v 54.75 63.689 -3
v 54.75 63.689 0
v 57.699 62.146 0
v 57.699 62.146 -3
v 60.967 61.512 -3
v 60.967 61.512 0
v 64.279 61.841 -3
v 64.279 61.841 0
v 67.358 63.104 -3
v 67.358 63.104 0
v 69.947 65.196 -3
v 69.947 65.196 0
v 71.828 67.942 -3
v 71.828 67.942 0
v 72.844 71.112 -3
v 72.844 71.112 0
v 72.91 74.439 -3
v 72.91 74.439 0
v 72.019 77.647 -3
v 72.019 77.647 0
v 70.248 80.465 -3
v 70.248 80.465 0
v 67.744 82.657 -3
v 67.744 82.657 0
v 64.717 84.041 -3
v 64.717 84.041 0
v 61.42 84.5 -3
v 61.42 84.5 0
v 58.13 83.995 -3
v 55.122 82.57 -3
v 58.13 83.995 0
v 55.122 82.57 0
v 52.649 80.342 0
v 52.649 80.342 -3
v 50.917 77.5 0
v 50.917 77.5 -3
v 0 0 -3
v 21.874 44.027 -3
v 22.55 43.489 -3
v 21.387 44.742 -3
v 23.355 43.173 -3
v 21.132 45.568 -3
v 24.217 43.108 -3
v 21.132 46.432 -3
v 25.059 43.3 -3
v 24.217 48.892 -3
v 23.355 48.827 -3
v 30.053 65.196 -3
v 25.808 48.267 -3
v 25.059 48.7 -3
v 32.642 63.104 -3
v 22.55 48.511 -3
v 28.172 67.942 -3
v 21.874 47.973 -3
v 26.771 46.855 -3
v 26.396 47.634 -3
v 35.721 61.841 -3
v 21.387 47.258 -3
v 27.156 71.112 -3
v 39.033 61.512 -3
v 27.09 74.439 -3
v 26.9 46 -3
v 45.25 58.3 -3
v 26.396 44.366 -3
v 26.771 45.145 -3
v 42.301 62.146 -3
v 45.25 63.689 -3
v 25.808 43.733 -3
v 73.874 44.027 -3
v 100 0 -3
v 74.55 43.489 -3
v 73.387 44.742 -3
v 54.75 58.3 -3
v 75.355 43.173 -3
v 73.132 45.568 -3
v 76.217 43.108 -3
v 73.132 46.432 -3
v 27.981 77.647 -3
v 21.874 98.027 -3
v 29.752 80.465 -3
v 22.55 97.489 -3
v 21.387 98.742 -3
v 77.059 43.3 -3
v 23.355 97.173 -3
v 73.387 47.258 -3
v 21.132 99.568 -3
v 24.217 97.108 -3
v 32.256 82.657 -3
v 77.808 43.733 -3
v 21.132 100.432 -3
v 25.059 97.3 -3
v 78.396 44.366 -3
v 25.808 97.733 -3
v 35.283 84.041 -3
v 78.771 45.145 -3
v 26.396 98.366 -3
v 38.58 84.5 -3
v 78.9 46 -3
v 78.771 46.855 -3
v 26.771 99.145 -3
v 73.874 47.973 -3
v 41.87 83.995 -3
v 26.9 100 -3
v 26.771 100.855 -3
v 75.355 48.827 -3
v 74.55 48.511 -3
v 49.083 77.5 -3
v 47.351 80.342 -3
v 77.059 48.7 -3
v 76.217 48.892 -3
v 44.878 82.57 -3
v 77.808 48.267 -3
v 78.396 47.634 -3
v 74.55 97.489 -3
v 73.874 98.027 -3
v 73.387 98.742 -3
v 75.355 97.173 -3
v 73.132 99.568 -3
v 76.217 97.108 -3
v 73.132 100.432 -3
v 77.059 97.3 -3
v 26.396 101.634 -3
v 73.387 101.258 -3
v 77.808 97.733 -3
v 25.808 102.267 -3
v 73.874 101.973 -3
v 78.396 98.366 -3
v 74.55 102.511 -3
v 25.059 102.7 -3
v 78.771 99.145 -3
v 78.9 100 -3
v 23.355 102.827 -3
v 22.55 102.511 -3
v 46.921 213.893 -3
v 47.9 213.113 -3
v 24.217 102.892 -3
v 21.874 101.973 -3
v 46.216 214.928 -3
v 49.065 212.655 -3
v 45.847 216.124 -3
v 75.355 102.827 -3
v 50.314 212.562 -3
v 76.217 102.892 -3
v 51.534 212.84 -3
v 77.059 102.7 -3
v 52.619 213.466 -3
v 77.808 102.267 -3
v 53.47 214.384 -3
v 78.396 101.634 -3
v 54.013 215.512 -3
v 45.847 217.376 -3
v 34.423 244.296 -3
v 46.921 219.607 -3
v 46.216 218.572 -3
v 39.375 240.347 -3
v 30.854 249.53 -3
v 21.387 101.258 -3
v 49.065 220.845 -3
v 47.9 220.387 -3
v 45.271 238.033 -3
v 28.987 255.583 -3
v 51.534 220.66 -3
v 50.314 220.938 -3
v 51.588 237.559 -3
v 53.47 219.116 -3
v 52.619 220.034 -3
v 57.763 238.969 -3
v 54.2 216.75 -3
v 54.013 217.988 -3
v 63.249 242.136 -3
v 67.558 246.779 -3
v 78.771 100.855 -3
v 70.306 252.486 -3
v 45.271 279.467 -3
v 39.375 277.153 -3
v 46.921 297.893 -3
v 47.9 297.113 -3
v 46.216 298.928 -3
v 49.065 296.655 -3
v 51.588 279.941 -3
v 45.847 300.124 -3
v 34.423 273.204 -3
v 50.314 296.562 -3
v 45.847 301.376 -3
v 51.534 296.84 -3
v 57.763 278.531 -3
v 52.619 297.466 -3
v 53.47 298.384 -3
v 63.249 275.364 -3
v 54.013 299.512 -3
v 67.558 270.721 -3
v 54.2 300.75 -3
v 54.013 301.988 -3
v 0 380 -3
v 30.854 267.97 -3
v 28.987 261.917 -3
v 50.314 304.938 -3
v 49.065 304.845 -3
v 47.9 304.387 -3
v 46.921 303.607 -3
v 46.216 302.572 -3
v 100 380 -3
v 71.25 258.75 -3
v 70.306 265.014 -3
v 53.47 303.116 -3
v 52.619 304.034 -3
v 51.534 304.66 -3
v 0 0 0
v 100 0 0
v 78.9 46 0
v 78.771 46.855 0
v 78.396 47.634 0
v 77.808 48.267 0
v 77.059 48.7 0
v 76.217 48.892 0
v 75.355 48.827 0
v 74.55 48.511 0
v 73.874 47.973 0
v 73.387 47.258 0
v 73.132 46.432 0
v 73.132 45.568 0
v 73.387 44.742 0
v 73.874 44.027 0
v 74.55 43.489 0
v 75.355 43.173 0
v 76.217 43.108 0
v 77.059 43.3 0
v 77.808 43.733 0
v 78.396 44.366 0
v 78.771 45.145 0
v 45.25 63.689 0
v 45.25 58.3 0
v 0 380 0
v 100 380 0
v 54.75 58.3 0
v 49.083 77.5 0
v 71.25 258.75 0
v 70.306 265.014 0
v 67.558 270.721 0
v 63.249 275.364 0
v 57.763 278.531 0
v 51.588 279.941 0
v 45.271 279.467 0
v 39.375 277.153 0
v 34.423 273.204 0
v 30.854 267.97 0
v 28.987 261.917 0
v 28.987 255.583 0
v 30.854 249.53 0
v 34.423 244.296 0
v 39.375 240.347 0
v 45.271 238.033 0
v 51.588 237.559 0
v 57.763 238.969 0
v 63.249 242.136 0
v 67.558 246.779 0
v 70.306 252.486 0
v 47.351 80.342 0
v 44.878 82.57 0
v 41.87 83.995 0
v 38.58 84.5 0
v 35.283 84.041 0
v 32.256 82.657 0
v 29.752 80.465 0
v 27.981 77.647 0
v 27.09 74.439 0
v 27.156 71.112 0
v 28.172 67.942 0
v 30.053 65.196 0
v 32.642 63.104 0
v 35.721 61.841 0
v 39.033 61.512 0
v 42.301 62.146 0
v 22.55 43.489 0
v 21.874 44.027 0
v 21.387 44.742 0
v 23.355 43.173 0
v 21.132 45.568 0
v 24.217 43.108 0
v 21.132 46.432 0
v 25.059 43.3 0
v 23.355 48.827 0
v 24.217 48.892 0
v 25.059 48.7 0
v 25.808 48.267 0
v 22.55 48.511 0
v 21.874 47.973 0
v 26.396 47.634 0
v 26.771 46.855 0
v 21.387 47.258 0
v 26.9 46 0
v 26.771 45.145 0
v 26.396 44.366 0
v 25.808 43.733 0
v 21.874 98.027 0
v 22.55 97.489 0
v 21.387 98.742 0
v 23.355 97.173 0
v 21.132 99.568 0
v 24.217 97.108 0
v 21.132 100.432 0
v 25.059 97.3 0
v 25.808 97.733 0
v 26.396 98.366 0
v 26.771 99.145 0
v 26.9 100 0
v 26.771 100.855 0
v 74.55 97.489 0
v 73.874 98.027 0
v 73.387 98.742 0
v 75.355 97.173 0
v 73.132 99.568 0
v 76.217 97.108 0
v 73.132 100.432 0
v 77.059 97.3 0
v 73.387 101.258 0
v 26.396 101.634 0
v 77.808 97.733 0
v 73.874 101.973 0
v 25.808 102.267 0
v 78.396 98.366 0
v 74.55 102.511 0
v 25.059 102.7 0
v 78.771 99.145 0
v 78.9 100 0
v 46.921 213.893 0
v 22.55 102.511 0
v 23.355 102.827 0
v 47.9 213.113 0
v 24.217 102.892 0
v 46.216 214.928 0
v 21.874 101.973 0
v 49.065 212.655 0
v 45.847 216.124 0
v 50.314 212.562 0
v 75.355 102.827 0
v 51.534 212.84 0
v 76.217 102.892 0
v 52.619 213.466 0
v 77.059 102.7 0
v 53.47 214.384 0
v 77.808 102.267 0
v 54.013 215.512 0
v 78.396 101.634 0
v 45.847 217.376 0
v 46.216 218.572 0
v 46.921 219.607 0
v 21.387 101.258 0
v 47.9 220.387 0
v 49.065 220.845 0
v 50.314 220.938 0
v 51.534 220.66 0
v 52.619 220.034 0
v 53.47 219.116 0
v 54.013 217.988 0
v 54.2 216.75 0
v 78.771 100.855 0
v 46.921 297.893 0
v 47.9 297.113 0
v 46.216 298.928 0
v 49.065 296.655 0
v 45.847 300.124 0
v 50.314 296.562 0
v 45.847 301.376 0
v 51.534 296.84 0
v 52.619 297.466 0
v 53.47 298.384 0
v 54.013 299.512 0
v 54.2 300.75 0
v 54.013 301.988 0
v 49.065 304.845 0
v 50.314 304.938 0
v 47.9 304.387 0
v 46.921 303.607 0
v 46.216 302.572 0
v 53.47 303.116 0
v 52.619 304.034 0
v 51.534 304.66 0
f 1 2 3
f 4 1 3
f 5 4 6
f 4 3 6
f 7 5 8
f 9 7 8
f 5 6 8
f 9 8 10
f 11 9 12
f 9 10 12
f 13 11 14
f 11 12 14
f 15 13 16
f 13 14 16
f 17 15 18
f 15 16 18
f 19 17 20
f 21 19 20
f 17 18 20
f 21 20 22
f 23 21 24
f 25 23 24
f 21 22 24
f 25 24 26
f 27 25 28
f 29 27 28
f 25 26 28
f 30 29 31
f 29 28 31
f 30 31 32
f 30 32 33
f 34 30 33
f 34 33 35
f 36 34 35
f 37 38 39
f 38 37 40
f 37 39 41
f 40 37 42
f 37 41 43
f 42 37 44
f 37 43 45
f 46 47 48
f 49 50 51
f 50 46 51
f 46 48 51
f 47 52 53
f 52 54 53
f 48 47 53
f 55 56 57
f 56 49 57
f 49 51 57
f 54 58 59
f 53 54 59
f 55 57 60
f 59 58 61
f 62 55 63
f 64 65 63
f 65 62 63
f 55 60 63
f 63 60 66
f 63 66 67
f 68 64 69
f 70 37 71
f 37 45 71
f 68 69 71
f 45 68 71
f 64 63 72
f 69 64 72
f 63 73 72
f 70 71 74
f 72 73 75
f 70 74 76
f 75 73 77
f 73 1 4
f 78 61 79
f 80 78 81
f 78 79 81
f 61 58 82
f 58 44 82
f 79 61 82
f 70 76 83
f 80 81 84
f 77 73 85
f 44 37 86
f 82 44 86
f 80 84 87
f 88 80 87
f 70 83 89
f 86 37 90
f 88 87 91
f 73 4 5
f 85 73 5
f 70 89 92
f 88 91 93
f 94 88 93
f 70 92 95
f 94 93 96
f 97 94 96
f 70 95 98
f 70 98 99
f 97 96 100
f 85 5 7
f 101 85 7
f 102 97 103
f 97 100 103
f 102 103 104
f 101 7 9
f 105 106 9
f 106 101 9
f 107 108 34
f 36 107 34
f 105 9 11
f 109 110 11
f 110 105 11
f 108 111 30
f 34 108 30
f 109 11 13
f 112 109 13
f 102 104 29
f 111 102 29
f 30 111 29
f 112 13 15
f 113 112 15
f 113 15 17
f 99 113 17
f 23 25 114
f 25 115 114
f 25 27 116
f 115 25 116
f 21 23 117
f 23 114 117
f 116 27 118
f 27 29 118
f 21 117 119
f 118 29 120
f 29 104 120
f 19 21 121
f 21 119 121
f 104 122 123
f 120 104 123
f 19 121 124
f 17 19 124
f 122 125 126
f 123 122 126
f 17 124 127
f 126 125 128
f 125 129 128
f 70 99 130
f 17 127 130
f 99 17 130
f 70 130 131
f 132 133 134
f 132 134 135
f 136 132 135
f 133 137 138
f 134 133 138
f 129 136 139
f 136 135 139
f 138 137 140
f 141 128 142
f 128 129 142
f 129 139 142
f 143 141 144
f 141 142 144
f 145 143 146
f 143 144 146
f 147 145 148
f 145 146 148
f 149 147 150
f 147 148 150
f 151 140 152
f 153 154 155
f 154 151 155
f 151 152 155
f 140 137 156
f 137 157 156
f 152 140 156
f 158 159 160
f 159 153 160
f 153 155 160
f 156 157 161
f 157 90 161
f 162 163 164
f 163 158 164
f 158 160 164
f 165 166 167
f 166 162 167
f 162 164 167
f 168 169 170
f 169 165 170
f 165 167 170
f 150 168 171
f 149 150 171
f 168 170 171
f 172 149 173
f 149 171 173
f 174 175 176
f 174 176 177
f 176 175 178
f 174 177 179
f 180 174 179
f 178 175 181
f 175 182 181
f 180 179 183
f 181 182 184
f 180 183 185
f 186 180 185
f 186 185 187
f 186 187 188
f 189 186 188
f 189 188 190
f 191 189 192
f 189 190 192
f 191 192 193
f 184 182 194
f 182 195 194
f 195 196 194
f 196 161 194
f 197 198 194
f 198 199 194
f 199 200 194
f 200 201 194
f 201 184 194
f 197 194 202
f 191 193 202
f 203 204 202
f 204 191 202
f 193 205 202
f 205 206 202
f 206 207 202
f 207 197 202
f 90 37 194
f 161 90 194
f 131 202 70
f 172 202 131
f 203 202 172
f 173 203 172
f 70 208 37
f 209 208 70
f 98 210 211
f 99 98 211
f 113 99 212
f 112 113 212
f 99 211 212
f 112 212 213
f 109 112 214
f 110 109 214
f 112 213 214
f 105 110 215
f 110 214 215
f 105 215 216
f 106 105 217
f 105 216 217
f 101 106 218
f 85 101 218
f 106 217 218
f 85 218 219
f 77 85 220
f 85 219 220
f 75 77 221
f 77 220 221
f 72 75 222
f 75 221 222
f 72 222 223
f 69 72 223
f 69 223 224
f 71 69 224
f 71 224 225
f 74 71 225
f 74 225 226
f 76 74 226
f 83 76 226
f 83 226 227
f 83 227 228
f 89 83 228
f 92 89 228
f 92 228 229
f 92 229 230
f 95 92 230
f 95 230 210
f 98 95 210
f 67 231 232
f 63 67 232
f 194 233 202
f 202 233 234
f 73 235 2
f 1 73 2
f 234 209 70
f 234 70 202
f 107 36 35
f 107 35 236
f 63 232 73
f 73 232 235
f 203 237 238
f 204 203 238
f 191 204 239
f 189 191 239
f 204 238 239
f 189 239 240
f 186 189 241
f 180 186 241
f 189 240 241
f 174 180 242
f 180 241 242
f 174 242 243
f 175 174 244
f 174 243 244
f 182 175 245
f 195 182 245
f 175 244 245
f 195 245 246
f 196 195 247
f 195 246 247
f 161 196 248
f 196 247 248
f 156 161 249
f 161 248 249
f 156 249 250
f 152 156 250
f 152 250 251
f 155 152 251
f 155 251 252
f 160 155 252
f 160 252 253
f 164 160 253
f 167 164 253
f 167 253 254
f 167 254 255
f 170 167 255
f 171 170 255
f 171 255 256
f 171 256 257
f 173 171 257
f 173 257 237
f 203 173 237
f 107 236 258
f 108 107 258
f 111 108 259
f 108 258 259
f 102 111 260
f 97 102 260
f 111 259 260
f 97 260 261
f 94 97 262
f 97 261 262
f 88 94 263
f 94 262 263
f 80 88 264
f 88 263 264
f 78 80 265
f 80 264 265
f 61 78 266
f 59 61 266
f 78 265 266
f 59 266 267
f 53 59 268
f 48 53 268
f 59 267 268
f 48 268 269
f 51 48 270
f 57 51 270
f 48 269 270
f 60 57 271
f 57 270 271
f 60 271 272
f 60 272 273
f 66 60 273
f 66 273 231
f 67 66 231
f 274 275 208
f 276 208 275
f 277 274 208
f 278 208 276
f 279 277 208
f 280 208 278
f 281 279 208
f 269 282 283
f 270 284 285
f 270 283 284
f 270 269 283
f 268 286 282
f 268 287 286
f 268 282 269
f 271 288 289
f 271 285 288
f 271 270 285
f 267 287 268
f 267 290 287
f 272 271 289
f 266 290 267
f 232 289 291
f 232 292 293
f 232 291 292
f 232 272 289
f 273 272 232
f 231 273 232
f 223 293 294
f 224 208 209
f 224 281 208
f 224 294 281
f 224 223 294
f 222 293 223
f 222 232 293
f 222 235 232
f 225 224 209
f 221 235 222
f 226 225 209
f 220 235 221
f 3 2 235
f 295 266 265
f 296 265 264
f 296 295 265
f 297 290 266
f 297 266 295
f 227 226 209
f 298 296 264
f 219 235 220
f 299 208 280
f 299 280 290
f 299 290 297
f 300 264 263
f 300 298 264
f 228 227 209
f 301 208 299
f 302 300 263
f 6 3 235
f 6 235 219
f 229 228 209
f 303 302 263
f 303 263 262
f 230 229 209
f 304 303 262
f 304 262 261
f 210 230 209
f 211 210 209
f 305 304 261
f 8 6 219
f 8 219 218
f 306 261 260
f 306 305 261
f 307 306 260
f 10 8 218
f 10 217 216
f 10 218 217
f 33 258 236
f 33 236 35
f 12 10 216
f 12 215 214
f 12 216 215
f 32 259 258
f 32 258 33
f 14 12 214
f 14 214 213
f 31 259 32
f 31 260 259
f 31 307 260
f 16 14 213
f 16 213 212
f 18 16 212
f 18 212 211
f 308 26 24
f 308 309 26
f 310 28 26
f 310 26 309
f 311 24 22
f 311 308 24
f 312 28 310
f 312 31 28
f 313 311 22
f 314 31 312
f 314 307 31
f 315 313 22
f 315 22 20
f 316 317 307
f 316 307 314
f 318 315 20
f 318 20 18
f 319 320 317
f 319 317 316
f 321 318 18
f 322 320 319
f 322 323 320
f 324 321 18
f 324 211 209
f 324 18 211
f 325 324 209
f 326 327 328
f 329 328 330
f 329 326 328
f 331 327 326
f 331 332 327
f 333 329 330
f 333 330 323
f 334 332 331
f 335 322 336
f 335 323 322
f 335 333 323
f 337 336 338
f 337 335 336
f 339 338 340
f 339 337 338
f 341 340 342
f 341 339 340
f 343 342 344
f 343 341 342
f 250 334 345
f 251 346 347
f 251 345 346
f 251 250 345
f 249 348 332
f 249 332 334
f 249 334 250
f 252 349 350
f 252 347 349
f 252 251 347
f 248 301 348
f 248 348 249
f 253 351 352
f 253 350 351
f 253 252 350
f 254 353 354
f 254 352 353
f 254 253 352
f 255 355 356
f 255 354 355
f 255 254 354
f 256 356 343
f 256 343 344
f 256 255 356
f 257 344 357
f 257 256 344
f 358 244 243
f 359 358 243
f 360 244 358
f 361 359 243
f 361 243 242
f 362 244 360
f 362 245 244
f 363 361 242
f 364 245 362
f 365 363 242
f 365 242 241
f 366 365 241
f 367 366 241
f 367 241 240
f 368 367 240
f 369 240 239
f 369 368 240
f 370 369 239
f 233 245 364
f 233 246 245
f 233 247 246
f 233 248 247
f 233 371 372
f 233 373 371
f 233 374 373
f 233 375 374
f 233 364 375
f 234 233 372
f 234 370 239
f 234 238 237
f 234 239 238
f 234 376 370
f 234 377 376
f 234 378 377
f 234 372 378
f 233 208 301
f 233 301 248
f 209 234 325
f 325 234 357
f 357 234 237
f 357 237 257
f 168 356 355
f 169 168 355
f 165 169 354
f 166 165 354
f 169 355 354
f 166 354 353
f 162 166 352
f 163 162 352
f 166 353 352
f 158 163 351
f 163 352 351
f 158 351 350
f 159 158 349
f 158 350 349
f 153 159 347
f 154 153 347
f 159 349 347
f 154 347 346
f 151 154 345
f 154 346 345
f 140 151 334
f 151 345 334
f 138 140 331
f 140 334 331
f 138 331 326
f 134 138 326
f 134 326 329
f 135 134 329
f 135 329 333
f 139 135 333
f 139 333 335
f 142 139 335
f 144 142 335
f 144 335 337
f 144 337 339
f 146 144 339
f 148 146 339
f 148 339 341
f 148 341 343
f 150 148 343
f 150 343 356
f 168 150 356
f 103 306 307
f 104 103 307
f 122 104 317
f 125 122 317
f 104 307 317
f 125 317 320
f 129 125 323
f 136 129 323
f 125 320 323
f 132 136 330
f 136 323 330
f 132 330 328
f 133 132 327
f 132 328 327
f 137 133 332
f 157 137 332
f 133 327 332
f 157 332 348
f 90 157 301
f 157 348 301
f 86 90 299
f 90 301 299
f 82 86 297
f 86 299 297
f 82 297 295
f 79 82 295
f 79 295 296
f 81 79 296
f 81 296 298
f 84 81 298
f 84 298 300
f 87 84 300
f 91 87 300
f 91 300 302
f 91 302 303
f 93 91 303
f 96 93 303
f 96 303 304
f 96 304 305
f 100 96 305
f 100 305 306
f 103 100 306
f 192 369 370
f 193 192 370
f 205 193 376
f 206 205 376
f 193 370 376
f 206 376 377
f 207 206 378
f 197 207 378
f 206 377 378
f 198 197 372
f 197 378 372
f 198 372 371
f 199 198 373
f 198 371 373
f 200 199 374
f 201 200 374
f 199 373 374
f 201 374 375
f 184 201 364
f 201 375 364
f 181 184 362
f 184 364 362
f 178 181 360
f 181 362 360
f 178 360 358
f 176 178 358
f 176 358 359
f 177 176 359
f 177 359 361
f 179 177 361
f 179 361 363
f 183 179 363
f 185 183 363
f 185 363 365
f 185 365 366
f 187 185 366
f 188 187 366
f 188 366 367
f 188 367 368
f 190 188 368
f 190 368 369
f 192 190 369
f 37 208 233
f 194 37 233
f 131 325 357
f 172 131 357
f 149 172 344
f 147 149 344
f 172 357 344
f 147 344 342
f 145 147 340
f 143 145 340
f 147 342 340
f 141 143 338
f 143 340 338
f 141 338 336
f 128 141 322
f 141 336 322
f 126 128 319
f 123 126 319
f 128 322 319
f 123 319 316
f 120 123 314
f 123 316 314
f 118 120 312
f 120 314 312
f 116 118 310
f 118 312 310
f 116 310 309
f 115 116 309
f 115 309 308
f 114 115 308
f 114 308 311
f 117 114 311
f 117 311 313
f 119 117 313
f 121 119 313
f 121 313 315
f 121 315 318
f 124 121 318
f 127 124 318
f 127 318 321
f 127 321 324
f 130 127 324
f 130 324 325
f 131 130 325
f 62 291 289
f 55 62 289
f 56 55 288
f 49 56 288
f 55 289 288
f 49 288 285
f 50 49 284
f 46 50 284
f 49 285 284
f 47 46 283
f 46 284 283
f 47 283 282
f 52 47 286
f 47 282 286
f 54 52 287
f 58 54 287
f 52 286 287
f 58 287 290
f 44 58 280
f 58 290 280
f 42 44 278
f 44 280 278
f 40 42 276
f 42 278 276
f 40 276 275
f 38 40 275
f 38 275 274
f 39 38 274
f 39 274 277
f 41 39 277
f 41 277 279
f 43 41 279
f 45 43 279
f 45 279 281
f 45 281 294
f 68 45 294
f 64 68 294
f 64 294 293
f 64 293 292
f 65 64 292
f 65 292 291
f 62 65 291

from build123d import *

# Parameters (mm, degrees)
SKETCH1_W           = 100
SKETCH1_H           = 380
BOSS_EXTRUDE1_DEPTH = 3
SKETCH1_4_R         = 2.9
SKETCH1_4_R_2       = 4.2
SKETCH1_4_R_3       = 21.25
CUT_EXTRUDE1_DEPTH  = 10


with BuildPart() as part:
    # Sketch1 → Boss-Extrude1 (new body)
    with BuildSketch(Plane.XY):
        with Locations((50, 190)):
            Rectangle(SKETCH1_W, SKETCH1_H)
    extrude(amount=-BOSS_EXTRUDE1_DEPTH)

    # Sketch1<4> → Cut-Extrude1 (cut)
    with BuildSketch(Plane.XY):
        with Locations((24, 100)):
            Circle(SKETCH1_4_R)
        with Locations((76, 100)):
            Circle(SKETCH1_4_R)
        with Locations((24, 46)):
            Circle(SKETCH1_4_R)
        with BuildLine():
            Line((54.75, 58.3), (54.75, 63.689387775))
            ThreePointArc((54.75, 63.689387775), (72.581133525, 76.075464159), (50.916994756, 77.5))
            Line((50.916994756, 77.5), (49.083005244, 77.5))
            ThreePointArc((49.083005244, 77.5), (27.418866475, 76.075464159), (45.25, 63.689387775))
            Line((45.25, 63.689387775), (45.25, 58.3))
            Line((45.25, 58.3), (50, 58.3))
            Line((50, 58.3), (54.75, 58.3))
        make_face()
        with Locations((50, 300.75)):
            Circle(SKETCH1_4_R_2)
        with Locations((50, 258.75)):
            Circle(SKETCH1_4_R_3)
        with Locations((50, 216.75)):
            Circle(SKETCH1_4_R_2)
        with Locations((76, 46)):
            Circle(SKETCH1_4_R)
    extrude(amount=-CUT_EXTRUDE1_DEPTH, mode=Mode.SUBTRACT)


solid = part.part
